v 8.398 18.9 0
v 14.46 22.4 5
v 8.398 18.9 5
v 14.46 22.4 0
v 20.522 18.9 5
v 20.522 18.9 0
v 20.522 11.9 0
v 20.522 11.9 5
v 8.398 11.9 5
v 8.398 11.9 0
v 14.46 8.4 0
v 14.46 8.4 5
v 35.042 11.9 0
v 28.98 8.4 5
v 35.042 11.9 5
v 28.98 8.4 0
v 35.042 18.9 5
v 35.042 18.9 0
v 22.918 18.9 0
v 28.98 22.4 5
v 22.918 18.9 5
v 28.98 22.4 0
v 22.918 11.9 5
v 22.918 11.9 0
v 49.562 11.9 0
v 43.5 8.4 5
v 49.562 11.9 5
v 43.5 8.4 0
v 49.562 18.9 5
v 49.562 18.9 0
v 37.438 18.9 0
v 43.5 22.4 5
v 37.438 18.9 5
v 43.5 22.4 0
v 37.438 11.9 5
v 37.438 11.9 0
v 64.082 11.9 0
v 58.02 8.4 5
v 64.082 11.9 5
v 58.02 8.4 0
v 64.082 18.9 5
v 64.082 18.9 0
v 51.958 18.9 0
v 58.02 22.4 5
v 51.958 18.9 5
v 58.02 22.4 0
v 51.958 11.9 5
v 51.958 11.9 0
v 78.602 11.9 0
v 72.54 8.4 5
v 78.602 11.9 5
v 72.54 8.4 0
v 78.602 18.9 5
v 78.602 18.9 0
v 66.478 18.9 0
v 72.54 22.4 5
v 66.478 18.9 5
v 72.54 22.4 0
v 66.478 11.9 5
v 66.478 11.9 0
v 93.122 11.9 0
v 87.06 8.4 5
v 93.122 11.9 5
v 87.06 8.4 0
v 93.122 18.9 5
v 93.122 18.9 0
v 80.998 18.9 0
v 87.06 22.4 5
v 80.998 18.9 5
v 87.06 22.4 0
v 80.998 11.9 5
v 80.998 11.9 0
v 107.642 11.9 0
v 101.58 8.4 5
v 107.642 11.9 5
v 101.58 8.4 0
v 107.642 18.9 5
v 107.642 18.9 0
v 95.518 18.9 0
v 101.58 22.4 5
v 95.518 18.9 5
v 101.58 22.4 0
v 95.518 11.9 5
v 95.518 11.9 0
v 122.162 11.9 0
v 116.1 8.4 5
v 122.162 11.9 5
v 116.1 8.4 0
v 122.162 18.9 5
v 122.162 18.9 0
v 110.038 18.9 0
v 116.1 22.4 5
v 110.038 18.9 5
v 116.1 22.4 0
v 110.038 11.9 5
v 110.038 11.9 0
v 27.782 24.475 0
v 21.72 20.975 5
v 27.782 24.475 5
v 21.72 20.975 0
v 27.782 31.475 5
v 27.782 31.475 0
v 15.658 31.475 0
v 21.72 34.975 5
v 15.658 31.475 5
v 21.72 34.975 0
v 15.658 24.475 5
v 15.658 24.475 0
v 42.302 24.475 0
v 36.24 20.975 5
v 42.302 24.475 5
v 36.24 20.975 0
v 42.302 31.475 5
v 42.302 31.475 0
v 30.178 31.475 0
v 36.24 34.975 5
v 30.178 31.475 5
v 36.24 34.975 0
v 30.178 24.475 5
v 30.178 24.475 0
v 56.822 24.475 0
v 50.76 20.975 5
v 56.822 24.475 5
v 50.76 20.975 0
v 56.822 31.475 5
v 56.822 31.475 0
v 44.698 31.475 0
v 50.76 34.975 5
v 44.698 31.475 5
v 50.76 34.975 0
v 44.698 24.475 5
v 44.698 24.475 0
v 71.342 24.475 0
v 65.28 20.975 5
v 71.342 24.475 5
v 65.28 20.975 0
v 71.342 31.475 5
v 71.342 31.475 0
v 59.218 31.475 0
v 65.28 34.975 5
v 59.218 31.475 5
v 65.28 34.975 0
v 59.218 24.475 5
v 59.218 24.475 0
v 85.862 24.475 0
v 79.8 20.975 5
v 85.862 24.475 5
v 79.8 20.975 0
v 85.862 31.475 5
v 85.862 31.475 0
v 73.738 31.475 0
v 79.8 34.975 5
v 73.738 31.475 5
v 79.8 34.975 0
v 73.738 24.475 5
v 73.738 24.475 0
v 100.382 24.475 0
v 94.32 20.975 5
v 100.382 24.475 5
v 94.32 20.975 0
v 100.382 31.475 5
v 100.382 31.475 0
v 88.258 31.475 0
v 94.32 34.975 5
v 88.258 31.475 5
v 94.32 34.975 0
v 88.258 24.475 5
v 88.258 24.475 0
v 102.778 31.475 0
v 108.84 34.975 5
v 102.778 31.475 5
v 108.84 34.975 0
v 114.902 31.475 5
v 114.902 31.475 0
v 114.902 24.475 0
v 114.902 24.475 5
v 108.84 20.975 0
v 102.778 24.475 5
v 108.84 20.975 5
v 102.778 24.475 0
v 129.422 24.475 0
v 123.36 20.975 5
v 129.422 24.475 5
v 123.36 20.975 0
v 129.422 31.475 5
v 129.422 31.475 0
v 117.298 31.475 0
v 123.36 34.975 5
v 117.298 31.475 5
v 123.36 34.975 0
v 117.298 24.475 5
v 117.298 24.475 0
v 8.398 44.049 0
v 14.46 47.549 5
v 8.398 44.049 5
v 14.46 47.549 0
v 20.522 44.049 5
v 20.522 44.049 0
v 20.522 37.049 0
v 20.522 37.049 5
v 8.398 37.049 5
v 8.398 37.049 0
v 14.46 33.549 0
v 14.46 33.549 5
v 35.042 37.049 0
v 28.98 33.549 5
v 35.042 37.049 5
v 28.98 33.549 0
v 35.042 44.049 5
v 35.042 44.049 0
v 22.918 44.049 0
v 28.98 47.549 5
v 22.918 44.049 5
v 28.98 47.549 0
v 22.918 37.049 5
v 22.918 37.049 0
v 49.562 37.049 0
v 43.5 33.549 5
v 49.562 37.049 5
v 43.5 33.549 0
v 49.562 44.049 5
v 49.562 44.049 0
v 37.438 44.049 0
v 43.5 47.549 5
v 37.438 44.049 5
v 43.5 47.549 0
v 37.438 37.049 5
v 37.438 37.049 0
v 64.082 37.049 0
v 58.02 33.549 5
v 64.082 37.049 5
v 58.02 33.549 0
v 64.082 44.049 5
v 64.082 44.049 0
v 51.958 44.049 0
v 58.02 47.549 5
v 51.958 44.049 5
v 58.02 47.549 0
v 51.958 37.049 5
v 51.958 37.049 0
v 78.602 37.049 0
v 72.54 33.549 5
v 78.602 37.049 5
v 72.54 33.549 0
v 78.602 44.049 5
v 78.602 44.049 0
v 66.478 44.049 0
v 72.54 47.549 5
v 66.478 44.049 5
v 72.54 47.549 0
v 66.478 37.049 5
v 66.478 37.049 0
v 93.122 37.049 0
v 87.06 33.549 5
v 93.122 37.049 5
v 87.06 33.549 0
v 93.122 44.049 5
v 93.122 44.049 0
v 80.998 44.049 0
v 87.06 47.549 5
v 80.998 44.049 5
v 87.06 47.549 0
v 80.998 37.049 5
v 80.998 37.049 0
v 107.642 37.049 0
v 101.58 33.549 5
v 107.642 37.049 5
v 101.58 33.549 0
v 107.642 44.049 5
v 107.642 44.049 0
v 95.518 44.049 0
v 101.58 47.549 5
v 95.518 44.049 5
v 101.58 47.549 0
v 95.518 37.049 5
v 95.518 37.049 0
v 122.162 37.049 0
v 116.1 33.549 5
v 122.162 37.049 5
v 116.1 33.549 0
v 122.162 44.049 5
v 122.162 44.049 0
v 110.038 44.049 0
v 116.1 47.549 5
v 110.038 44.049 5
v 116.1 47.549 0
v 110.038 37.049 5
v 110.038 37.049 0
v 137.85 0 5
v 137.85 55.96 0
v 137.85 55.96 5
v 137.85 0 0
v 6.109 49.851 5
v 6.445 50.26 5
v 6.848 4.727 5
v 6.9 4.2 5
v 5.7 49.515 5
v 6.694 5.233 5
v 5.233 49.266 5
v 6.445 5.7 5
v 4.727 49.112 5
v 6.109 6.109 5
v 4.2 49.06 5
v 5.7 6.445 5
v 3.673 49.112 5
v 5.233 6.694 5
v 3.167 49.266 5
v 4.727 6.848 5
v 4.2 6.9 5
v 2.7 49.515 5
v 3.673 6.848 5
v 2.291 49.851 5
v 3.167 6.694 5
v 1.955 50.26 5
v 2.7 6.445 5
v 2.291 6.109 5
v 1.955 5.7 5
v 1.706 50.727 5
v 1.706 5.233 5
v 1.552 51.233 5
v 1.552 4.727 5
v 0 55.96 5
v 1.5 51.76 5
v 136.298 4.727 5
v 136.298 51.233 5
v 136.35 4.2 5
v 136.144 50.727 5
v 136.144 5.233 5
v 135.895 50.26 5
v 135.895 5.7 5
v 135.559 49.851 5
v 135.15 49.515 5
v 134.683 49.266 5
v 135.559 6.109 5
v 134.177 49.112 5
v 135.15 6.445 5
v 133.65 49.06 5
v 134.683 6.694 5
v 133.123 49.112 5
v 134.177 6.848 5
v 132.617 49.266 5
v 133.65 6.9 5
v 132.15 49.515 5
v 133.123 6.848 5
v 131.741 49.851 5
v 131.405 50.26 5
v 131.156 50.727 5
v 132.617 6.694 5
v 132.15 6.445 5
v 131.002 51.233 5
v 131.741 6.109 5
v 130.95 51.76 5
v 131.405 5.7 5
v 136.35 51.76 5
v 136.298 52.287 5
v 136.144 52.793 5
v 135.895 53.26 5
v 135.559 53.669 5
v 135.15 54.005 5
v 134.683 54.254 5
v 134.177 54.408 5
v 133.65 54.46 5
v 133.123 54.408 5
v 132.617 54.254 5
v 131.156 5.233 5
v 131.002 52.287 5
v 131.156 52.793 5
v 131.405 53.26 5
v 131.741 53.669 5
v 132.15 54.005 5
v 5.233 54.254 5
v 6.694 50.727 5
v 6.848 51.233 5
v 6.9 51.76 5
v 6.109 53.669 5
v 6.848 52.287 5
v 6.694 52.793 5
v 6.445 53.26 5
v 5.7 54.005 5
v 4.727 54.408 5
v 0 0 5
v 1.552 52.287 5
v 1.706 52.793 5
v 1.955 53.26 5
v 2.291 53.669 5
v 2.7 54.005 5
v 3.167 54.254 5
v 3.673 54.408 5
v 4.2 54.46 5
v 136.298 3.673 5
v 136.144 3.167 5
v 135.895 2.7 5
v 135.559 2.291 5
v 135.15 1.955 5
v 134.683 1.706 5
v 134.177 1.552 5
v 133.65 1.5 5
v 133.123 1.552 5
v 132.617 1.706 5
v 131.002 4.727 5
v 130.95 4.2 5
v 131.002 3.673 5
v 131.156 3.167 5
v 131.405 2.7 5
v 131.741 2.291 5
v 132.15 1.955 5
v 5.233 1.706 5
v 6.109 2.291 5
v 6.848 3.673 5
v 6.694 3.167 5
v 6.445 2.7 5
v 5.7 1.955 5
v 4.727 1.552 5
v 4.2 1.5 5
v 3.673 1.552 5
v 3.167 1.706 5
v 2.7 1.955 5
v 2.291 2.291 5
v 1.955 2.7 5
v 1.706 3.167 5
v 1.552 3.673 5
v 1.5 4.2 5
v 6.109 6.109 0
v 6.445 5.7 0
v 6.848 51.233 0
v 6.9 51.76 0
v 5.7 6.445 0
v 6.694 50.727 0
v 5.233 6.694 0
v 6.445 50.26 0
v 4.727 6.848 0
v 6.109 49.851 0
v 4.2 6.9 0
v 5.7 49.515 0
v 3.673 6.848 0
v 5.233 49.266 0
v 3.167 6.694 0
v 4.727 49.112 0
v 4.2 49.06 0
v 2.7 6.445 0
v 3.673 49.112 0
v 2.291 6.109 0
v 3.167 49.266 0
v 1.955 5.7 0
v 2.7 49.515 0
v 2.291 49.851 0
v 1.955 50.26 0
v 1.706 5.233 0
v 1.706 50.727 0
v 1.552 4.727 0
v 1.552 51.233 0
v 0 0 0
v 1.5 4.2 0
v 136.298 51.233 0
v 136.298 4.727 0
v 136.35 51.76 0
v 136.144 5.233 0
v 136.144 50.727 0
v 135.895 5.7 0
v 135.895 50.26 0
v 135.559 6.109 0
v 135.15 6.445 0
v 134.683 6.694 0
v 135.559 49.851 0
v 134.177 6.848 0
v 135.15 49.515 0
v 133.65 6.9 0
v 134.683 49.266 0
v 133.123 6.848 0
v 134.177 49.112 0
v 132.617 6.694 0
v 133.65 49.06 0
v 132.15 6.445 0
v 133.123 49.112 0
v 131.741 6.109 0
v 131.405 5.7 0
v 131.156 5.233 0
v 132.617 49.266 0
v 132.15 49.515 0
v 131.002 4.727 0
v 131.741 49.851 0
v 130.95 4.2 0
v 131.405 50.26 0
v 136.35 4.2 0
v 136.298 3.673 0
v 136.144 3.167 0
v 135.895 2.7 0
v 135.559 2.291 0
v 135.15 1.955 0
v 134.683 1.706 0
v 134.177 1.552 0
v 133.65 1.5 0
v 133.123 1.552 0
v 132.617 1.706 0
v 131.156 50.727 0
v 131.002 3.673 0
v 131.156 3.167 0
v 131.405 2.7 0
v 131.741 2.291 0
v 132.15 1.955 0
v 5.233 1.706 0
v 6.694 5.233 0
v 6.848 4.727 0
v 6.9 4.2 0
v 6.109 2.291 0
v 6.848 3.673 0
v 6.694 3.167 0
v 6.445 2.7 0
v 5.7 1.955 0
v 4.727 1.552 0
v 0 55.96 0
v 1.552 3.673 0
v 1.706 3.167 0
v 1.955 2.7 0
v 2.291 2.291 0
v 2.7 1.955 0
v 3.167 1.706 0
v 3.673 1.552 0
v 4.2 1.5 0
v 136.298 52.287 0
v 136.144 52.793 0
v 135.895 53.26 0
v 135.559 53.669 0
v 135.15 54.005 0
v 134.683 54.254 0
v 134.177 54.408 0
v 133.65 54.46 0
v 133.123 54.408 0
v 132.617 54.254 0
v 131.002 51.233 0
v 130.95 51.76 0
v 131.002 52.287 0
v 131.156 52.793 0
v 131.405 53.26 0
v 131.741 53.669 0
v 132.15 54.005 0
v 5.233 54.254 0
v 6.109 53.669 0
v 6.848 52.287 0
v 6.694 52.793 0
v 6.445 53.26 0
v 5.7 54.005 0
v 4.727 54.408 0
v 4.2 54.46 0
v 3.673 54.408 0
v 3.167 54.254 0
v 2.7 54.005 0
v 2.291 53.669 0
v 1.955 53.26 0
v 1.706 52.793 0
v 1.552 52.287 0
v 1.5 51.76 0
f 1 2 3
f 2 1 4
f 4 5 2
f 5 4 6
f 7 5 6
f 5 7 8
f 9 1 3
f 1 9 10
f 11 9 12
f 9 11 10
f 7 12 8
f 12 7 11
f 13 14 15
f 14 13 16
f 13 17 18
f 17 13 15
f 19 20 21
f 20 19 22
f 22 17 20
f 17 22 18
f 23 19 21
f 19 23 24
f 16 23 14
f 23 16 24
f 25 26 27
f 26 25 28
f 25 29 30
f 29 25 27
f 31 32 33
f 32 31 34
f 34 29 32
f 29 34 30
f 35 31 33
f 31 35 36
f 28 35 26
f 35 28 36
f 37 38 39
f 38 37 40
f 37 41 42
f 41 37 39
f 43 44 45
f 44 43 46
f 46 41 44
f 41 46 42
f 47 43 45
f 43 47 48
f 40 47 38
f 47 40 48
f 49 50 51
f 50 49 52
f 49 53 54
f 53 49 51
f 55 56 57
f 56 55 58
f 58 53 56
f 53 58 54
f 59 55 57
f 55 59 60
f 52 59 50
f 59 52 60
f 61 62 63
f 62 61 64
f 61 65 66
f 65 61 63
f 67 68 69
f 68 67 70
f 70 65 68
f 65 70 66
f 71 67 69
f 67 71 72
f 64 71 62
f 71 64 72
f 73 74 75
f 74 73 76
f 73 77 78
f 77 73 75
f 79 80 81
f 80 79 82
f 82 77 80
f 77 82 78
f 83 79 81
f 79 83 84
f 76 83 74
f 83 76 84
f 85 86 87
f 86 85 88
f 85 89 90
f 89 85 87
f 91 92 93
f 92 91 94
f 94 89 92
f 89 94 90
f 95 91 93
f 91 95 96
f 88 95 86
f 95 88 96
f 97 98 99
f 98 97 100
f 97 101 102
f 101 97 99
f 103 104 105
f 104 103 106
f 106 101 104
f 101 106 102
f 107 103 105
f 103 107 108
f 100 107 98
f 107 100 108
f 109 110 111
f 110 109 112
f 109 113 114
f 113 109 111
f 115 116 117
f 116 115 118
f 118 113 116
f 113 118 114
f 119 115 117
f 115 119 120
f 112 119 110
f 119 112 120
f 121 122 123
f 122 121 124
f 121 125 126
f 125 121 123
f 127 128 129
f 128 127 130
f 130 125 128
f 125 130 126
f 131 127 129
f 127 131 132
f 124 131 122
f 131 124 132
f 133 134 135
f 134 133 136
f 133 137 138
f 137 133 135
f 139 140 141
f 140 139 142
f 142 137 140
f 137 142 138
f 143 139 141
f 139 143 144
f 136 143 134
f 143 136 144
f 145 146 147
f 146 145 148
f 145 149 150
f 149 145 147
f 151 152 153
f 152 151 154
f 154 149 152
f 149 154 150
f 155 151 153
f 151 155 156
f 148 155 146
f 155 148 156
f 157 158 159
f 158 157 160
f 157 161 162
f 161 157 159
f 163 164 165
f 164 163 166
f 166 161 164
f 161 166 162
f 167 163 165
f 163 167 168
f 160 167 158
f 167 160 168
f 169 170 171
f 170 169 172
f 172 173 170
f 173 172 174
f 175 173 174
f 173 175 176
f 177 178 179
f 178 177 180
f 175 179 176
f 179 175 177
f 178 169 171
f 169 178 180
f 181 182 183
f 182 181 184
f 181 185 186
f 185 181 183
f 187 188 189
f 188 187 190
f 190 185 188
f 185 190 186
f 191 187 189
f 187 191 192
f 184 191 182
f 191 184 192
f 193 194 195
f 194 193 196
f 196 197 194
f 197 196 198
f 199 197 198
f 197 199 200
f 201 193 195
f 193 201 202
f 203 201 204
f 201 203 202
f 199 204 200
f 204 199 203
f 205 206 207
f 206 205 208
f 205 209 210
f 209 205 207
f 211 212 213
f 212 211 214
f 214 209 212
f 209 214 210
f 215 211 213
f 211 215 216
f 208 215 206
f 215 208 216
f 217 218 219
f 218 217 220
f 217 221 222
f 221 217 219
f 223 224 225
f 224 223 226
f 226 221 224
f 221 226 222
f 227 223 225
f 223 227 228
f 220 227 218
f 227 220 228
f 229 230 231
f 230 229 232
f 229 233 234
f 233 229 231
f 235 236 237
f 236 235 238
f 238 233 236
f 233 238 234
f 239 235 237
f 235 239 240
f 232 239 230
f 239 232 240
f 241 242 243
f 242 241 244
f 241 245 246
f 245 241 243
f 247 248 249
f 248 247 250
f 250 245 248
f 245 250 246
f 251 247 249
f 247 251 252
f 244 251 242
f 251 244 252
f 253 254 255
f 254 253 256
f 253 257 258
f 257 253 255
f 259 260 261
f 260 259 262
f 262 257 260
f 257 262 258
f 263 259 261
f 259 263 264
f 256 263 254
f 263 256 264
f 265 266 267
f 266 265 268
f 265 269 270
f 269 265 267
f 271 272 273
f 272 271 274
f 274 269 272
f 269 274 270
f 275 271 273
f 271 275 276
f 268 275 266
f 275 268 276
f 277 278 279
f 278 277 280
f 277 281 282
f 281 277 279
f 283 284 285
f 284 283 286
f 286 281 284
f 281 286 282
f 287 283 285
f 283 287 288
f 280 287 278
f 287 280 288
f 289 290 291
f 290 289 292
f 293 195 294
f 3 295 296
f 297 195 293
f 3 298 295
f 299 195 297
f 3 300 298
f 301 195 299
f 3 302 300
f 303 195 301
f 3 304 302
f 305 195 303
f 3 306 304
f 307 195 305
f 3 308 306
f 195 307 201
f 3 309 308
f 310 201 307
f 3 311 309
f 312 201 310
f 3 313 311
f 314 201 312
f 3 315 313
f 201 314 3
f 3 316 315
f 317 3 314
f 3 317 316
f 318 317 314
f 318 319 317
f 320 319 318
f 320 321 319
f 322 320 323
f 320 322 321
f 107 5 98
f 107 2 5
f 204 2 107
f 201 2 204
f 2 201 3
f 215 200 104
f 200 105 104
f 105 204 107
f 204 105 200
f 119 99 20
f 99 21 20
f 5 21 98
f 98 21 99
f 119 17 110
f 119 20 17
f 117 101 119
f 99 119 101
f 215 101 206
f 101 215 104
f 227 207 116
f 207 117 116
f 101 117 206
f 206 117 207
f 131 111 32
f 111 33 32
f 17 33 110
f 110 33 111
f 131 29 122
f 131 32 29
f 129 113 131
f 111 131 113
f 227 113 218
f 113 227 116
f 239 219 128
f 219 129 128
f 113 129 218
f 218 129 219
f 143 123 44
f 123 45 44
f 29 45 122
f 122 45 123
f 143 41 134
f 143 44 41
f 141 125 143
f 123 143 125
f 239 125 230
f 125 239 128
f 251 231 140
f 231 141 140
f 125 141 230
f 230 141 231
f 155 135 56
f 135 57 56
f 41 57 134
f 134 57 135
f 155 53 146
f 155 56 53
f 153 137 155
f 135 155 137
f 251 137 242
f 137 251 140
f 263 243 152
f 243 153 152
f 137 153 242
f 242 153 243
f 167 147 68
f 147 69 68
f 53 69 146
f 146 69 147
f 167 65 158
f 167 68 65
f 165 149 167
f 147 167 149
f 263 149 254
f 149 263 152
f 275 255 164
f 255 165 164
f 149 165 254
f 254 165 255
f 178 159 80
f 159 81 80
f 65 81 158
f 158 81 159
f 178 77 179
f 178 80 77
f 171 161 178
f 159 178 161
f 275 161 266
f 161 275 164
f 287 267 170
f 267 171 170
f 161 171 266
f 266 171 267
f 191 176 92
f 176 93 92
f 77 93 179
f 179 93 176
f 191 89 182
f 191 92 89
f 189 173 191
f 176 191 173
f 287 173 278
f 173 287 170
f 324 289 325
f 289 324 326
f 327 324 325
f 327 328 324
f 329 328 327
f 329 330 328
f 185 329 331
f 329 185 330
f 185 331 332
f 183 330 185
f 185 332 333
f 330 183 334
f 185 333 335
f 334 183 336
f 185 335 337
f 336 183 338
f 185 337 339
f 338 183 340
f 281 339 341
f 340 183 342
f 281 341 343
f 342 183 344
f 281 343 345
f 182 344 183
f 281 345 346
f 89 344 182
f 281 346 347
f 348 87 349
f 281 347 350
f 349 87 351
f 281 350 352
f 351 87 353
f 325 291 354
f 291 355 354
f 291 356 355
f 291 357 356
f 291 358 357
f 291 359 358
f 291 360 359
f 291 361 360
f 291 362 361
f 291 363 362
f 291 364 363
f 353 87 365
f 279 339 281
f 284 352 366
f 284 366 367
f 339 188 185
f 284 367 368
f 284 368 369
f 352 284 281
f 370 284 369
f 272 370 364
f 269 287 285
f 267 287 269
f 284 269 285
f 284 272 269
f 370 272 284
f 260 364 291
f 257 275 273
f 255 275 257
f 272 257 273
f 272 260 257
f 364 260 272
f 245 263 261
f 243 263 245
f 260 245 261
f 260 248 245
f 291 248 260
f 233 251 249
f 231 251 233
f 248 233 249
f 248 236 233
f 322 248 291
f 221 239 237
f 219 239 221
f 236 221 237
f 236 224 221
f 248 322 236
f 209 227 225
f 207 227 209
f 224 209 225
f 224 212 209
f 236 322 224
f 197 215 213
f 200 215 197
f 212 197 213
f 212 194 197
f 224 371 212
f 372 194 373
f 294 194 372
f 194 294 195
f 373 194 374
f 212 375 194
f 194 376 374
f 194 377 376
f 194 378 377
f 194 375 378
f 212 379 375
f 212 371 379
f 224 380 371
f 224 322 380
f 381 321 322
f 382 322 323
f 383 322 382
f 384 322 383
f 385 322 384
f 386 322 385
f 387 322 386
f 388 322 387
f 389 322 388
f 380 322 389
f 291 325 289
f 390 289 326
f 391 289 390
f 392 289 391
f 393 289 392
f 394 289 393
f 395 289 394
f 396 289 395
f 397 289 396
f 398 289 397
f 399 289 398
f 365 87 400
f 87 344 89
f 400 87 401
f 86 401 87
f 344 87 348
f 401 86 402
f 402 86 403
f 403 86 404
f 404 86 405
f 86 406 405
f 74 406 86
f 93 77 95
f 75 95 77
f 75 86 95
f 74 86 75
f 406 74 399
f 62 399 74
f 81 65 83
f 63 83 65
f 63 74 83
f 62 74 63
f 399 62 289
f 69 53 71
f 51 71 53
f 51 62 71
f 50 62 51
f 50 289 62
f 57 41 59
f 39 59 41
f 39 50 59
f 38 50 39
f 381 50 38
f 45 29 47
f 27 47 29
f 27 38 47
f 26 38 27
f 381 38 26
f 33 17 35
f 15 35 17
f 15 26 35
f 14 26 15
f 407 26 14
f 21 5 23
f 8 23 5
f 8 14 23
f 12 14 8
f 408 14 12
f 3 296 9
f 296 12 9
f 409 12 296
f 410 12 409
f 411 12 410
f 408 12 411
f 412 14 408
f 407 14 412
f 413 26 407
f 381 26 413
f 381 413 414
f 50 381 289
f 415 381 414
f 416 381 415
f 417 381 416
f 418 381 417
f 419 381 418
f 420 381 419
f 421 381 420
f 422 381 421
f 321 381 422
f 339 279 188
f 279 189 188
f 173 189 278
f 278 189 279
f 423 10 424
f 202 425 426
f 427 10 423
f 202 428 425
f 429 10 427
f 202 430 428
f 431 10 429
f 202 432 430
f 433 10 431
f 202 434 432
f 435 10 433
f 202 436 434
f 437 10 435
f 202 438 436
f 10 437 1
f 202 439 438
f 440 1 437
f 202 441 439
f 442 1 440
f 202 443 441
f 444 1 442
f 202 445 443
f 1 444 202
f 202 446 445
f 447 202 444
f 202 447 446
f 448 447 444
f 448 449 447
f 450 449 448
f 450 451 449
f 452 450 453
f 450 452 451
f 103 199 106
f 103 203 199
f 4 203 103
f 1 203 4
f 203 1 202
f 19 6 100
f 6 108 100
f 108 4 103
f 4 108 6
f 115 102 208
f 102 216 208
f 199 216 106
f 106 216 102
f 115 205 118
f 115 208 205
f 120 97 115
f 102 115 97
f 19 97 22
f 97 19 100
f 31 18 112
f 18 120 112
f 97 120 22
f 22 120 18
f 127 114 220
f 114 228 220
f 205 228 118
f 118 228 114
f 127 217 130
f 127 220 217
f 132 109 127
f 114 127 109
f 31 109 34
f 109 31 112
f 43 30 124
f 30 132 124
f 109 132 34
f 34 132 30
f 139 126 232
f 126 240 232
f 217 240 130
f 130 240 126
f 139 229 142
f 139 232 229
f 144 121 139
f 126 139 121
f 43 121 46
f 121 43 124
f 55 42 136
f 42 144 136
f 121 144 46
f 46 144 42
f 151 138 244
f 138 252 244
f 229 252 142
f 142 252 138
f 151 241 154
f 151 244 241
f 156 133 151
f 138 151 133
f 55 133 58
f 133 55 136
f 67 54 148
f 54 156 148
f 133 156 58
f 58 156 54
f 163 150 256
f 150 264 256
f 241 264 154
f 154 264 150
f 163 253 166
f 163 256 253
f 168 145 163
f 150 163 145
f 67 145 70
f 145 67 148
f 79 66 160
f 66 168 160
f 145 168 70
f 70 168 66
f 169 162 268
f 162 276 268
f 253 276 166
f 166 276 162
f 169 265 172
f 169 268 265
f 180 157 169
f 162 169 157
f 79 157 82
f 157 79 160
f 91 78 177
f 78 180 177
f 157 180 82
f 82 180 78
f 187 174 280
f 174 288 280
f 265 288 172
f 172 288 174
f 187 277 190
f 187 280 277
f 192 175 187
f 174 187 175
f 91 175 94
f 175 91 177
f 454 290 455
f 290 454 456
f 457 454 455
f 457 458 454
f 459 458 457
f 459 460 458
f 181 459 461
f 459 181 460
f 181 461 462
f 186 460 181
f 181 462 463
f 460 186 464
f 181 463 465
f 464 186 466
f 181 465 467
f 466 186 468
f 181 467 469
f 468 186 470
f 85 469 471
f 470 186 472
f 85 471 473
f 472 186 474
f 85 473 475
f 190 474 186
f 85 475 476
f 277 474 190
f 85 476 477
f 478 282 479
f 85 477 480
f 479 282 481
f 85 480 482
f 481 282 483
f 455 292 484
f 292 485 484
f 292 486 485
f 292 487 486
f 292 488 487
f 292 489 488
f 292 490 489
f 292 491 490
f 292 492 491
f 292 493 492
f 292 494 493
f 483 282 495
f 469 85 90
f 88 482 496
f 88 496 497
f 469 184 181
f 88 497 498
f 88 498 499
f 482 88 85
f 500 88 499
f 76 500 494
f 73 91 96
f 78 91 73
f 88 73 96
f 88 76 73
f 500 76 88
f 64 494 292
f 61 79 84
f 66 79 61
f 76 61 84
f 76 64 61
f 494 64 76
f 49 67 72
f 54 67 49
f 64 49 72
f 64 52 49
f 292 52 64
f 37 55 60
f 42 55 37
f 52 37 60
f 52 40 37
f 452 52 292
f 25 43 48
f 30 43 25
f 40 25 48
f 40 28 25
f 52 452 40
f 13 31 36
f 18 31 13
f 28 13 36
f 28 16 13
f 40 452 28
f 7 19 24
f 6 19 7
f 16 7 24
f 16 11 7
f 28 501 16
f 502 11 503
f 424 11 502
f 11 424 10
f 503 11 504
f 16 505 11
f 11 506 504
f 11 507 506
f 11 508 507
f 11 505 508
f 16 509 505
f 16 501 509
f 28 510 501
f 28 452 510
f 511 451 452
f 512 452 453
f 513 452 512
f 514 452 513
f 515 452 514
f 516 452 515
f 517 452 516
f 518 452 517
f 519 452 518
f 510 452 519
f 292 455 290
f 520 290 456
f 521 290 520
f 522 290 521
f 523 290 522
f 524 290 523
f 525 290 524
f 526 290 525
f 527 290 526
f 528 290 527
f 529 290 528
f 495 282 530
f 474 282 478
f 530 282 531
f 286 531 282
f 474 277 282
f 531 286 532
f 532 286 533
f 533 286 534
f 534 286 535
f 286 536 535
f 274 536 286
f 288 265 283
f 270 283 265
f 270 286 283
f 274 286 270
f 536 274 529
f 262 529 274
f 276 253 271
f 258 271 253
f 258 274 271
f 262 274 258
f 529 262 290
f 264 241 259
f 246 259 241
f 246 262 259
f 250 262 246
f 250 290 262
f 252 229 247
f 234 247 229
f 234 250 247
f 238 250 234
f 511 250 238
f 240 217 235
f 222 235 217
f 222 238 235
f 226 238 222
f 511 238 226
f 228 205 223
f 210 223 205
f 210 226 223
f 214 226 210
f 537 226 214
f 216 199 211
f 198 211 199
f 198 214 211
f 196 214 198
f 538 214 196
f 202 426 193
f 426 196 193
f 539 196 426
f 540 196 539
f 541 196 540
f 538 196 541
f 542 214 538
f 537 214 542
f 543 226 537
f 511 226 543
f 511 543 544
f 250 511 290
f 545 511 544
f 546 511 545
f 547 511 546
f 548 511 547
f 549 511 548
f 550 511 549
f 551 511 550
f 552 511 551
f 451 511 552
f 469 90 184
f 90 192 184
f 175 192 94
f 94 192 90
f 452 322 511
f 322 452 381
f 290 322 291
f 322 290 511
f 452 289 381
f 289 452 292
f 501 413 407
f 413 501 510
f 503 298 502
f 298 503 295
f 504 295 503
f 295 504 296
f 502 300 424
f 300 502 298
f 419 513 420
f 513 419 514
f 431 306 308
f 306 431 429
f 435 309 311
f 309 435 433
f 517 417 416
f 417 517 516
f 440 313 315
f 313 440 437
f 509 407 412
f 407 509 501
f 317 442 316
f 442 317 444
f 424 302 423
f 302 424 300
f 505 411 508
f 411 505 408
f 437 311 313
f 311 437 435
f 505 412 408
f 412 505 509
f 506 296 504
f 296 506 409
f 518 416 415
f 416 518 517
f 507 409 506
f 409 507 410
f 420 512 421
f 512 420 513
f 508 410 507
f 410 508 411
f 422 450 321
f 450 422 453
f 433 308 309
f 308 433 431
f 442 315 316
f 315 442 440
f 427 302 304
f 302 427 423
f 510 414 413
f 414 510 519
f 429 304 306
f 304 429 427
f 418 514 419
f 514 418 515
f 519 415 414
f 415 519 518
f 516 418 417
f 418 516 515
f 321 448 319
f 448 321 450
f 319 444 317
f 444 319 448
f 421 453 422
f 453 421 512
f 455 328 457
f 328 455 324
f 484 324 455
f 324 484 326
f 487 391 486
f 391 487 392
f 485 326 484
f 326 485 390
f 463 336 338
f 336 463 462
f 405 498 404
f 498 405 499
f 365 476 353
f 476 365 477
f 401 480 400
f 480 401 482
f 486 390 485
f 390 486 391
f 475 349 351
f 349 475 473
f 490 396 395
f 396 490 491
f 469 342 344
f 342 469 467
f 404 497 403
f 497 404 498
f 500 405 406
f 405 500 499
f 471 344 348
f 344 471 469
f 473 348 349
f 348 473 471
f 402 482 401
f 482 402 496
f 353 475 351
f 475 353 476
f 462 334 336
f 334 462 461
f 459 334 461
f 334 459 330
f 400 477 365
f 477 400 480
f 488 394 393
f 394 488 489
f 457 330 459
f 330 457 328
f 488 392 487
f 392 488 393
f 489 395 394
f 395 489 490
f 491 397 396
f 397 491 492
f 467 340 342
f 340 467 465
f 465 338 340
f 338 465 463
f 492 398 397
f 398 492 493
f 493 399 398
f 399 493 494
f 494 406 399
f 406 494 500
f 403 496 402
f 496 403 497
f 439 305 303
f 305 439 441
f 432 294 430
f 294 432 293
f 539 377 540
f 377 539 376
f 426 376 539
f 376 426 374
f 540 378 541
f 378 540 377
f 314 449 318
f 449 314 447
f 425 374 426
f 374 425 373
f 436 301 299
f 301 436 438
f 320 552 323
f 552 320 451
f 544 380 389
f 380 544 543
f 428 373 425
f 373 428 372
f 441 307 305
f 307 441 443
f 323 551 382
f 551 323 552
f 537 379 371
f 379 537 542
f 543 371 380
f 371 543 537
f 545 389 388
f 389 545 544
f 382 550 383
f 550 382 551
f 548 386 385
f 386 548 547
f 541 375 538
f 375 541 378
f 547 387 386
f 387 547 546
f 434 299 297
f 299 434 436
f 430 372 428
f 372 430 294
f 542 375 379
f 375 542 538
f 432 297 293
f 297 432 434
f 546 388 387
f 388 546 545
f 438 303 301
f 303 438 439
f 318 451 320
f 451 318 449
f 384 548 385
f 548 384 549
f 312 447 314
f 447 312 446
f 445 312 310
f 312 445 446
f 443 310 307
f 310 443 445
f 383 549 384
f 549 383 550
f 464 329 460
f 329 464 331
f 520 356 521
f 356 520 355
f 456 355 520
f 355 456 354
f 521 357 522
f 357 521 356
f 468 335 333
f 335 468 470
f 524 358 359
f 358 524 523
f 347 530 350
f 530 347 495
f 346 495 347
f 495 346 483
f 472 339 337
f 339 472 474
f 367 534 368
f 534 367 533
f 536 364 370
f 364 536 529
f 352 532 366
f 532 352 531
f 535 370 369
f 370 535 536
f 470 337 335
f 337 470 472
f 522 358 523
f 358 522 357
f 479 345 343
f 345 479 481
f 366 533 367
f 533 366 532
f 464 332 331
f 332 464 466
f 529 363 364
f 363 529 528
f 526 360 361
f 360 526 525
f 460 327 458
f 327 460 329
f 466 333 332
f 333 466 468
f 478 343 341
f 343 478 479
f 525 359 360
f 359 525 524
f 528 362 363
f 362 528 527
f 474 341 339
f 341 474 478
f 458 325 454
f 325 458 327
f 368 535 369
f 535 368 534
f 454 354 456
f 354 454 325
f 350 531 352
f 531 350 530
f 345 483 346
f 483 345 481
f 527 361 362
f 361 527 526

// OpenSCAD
$fn = 32;

// ----------------------------------------------------------------------
// Honeycomb panel: 137.85 x 55.96 mm, 24 cells of 14 mm
// ----------------------------------------------------------------------

// --- parameters (mm) ---
panel_w = 137.85;         // panel width
panel_d = 55.96;          // panel depth
thick = 5;                // panel thickness
cell_r = 7;               // hex cell circumradius
pitch = 14.52;            // hex cell pitch (centre to centre)
web = 2.4;                // web between the cells
columns = 8;              // columns of cells
rows = 3;                 // rows of cells
cell_count = 24;          // total cells
shift_x = 14.46;          // first cell offset in x
shift_y = 15.4;           // first cell offset in y
mount_d = 5.4;            // corner mounting holes
hole_off = 4.2;           // mounting hole offset from the corners

difference() {
  union() {
    cube([panel_w, panel_d, thick]);
  }
  /* hexagonal cells, point-up, cut right through the plate */
  for (row = [0 : rows - 1]) {
    for (col = [0 : columns - 1]) {
      translate([shift_x + col * pitch + (row % 2) * pitch / 2, shift_y + row * pitch * 0.866025, -2.5]) rotate([0, 0, 30]) cylinder(h = thick + 5, d = 2 * cell_r, $fn = 6);
    }
  }
  /* corner mounting holes, clear of the outer cell web */
  translate([4.2, 4.2, -2.5]) cylinder(h = thick + 5, d = mount_d);
  translate([133.65, 4.2, -2.5]) cylinder(h = thick + 5, d = mount_d);
  translate([4.2, 51.76, -2.5]) cylinder(h = thick + 5, d = mount_d);
  translate([133.65, 51.76, -2.5]) cylinder(h = thick + 5, d = mount_d);
}
